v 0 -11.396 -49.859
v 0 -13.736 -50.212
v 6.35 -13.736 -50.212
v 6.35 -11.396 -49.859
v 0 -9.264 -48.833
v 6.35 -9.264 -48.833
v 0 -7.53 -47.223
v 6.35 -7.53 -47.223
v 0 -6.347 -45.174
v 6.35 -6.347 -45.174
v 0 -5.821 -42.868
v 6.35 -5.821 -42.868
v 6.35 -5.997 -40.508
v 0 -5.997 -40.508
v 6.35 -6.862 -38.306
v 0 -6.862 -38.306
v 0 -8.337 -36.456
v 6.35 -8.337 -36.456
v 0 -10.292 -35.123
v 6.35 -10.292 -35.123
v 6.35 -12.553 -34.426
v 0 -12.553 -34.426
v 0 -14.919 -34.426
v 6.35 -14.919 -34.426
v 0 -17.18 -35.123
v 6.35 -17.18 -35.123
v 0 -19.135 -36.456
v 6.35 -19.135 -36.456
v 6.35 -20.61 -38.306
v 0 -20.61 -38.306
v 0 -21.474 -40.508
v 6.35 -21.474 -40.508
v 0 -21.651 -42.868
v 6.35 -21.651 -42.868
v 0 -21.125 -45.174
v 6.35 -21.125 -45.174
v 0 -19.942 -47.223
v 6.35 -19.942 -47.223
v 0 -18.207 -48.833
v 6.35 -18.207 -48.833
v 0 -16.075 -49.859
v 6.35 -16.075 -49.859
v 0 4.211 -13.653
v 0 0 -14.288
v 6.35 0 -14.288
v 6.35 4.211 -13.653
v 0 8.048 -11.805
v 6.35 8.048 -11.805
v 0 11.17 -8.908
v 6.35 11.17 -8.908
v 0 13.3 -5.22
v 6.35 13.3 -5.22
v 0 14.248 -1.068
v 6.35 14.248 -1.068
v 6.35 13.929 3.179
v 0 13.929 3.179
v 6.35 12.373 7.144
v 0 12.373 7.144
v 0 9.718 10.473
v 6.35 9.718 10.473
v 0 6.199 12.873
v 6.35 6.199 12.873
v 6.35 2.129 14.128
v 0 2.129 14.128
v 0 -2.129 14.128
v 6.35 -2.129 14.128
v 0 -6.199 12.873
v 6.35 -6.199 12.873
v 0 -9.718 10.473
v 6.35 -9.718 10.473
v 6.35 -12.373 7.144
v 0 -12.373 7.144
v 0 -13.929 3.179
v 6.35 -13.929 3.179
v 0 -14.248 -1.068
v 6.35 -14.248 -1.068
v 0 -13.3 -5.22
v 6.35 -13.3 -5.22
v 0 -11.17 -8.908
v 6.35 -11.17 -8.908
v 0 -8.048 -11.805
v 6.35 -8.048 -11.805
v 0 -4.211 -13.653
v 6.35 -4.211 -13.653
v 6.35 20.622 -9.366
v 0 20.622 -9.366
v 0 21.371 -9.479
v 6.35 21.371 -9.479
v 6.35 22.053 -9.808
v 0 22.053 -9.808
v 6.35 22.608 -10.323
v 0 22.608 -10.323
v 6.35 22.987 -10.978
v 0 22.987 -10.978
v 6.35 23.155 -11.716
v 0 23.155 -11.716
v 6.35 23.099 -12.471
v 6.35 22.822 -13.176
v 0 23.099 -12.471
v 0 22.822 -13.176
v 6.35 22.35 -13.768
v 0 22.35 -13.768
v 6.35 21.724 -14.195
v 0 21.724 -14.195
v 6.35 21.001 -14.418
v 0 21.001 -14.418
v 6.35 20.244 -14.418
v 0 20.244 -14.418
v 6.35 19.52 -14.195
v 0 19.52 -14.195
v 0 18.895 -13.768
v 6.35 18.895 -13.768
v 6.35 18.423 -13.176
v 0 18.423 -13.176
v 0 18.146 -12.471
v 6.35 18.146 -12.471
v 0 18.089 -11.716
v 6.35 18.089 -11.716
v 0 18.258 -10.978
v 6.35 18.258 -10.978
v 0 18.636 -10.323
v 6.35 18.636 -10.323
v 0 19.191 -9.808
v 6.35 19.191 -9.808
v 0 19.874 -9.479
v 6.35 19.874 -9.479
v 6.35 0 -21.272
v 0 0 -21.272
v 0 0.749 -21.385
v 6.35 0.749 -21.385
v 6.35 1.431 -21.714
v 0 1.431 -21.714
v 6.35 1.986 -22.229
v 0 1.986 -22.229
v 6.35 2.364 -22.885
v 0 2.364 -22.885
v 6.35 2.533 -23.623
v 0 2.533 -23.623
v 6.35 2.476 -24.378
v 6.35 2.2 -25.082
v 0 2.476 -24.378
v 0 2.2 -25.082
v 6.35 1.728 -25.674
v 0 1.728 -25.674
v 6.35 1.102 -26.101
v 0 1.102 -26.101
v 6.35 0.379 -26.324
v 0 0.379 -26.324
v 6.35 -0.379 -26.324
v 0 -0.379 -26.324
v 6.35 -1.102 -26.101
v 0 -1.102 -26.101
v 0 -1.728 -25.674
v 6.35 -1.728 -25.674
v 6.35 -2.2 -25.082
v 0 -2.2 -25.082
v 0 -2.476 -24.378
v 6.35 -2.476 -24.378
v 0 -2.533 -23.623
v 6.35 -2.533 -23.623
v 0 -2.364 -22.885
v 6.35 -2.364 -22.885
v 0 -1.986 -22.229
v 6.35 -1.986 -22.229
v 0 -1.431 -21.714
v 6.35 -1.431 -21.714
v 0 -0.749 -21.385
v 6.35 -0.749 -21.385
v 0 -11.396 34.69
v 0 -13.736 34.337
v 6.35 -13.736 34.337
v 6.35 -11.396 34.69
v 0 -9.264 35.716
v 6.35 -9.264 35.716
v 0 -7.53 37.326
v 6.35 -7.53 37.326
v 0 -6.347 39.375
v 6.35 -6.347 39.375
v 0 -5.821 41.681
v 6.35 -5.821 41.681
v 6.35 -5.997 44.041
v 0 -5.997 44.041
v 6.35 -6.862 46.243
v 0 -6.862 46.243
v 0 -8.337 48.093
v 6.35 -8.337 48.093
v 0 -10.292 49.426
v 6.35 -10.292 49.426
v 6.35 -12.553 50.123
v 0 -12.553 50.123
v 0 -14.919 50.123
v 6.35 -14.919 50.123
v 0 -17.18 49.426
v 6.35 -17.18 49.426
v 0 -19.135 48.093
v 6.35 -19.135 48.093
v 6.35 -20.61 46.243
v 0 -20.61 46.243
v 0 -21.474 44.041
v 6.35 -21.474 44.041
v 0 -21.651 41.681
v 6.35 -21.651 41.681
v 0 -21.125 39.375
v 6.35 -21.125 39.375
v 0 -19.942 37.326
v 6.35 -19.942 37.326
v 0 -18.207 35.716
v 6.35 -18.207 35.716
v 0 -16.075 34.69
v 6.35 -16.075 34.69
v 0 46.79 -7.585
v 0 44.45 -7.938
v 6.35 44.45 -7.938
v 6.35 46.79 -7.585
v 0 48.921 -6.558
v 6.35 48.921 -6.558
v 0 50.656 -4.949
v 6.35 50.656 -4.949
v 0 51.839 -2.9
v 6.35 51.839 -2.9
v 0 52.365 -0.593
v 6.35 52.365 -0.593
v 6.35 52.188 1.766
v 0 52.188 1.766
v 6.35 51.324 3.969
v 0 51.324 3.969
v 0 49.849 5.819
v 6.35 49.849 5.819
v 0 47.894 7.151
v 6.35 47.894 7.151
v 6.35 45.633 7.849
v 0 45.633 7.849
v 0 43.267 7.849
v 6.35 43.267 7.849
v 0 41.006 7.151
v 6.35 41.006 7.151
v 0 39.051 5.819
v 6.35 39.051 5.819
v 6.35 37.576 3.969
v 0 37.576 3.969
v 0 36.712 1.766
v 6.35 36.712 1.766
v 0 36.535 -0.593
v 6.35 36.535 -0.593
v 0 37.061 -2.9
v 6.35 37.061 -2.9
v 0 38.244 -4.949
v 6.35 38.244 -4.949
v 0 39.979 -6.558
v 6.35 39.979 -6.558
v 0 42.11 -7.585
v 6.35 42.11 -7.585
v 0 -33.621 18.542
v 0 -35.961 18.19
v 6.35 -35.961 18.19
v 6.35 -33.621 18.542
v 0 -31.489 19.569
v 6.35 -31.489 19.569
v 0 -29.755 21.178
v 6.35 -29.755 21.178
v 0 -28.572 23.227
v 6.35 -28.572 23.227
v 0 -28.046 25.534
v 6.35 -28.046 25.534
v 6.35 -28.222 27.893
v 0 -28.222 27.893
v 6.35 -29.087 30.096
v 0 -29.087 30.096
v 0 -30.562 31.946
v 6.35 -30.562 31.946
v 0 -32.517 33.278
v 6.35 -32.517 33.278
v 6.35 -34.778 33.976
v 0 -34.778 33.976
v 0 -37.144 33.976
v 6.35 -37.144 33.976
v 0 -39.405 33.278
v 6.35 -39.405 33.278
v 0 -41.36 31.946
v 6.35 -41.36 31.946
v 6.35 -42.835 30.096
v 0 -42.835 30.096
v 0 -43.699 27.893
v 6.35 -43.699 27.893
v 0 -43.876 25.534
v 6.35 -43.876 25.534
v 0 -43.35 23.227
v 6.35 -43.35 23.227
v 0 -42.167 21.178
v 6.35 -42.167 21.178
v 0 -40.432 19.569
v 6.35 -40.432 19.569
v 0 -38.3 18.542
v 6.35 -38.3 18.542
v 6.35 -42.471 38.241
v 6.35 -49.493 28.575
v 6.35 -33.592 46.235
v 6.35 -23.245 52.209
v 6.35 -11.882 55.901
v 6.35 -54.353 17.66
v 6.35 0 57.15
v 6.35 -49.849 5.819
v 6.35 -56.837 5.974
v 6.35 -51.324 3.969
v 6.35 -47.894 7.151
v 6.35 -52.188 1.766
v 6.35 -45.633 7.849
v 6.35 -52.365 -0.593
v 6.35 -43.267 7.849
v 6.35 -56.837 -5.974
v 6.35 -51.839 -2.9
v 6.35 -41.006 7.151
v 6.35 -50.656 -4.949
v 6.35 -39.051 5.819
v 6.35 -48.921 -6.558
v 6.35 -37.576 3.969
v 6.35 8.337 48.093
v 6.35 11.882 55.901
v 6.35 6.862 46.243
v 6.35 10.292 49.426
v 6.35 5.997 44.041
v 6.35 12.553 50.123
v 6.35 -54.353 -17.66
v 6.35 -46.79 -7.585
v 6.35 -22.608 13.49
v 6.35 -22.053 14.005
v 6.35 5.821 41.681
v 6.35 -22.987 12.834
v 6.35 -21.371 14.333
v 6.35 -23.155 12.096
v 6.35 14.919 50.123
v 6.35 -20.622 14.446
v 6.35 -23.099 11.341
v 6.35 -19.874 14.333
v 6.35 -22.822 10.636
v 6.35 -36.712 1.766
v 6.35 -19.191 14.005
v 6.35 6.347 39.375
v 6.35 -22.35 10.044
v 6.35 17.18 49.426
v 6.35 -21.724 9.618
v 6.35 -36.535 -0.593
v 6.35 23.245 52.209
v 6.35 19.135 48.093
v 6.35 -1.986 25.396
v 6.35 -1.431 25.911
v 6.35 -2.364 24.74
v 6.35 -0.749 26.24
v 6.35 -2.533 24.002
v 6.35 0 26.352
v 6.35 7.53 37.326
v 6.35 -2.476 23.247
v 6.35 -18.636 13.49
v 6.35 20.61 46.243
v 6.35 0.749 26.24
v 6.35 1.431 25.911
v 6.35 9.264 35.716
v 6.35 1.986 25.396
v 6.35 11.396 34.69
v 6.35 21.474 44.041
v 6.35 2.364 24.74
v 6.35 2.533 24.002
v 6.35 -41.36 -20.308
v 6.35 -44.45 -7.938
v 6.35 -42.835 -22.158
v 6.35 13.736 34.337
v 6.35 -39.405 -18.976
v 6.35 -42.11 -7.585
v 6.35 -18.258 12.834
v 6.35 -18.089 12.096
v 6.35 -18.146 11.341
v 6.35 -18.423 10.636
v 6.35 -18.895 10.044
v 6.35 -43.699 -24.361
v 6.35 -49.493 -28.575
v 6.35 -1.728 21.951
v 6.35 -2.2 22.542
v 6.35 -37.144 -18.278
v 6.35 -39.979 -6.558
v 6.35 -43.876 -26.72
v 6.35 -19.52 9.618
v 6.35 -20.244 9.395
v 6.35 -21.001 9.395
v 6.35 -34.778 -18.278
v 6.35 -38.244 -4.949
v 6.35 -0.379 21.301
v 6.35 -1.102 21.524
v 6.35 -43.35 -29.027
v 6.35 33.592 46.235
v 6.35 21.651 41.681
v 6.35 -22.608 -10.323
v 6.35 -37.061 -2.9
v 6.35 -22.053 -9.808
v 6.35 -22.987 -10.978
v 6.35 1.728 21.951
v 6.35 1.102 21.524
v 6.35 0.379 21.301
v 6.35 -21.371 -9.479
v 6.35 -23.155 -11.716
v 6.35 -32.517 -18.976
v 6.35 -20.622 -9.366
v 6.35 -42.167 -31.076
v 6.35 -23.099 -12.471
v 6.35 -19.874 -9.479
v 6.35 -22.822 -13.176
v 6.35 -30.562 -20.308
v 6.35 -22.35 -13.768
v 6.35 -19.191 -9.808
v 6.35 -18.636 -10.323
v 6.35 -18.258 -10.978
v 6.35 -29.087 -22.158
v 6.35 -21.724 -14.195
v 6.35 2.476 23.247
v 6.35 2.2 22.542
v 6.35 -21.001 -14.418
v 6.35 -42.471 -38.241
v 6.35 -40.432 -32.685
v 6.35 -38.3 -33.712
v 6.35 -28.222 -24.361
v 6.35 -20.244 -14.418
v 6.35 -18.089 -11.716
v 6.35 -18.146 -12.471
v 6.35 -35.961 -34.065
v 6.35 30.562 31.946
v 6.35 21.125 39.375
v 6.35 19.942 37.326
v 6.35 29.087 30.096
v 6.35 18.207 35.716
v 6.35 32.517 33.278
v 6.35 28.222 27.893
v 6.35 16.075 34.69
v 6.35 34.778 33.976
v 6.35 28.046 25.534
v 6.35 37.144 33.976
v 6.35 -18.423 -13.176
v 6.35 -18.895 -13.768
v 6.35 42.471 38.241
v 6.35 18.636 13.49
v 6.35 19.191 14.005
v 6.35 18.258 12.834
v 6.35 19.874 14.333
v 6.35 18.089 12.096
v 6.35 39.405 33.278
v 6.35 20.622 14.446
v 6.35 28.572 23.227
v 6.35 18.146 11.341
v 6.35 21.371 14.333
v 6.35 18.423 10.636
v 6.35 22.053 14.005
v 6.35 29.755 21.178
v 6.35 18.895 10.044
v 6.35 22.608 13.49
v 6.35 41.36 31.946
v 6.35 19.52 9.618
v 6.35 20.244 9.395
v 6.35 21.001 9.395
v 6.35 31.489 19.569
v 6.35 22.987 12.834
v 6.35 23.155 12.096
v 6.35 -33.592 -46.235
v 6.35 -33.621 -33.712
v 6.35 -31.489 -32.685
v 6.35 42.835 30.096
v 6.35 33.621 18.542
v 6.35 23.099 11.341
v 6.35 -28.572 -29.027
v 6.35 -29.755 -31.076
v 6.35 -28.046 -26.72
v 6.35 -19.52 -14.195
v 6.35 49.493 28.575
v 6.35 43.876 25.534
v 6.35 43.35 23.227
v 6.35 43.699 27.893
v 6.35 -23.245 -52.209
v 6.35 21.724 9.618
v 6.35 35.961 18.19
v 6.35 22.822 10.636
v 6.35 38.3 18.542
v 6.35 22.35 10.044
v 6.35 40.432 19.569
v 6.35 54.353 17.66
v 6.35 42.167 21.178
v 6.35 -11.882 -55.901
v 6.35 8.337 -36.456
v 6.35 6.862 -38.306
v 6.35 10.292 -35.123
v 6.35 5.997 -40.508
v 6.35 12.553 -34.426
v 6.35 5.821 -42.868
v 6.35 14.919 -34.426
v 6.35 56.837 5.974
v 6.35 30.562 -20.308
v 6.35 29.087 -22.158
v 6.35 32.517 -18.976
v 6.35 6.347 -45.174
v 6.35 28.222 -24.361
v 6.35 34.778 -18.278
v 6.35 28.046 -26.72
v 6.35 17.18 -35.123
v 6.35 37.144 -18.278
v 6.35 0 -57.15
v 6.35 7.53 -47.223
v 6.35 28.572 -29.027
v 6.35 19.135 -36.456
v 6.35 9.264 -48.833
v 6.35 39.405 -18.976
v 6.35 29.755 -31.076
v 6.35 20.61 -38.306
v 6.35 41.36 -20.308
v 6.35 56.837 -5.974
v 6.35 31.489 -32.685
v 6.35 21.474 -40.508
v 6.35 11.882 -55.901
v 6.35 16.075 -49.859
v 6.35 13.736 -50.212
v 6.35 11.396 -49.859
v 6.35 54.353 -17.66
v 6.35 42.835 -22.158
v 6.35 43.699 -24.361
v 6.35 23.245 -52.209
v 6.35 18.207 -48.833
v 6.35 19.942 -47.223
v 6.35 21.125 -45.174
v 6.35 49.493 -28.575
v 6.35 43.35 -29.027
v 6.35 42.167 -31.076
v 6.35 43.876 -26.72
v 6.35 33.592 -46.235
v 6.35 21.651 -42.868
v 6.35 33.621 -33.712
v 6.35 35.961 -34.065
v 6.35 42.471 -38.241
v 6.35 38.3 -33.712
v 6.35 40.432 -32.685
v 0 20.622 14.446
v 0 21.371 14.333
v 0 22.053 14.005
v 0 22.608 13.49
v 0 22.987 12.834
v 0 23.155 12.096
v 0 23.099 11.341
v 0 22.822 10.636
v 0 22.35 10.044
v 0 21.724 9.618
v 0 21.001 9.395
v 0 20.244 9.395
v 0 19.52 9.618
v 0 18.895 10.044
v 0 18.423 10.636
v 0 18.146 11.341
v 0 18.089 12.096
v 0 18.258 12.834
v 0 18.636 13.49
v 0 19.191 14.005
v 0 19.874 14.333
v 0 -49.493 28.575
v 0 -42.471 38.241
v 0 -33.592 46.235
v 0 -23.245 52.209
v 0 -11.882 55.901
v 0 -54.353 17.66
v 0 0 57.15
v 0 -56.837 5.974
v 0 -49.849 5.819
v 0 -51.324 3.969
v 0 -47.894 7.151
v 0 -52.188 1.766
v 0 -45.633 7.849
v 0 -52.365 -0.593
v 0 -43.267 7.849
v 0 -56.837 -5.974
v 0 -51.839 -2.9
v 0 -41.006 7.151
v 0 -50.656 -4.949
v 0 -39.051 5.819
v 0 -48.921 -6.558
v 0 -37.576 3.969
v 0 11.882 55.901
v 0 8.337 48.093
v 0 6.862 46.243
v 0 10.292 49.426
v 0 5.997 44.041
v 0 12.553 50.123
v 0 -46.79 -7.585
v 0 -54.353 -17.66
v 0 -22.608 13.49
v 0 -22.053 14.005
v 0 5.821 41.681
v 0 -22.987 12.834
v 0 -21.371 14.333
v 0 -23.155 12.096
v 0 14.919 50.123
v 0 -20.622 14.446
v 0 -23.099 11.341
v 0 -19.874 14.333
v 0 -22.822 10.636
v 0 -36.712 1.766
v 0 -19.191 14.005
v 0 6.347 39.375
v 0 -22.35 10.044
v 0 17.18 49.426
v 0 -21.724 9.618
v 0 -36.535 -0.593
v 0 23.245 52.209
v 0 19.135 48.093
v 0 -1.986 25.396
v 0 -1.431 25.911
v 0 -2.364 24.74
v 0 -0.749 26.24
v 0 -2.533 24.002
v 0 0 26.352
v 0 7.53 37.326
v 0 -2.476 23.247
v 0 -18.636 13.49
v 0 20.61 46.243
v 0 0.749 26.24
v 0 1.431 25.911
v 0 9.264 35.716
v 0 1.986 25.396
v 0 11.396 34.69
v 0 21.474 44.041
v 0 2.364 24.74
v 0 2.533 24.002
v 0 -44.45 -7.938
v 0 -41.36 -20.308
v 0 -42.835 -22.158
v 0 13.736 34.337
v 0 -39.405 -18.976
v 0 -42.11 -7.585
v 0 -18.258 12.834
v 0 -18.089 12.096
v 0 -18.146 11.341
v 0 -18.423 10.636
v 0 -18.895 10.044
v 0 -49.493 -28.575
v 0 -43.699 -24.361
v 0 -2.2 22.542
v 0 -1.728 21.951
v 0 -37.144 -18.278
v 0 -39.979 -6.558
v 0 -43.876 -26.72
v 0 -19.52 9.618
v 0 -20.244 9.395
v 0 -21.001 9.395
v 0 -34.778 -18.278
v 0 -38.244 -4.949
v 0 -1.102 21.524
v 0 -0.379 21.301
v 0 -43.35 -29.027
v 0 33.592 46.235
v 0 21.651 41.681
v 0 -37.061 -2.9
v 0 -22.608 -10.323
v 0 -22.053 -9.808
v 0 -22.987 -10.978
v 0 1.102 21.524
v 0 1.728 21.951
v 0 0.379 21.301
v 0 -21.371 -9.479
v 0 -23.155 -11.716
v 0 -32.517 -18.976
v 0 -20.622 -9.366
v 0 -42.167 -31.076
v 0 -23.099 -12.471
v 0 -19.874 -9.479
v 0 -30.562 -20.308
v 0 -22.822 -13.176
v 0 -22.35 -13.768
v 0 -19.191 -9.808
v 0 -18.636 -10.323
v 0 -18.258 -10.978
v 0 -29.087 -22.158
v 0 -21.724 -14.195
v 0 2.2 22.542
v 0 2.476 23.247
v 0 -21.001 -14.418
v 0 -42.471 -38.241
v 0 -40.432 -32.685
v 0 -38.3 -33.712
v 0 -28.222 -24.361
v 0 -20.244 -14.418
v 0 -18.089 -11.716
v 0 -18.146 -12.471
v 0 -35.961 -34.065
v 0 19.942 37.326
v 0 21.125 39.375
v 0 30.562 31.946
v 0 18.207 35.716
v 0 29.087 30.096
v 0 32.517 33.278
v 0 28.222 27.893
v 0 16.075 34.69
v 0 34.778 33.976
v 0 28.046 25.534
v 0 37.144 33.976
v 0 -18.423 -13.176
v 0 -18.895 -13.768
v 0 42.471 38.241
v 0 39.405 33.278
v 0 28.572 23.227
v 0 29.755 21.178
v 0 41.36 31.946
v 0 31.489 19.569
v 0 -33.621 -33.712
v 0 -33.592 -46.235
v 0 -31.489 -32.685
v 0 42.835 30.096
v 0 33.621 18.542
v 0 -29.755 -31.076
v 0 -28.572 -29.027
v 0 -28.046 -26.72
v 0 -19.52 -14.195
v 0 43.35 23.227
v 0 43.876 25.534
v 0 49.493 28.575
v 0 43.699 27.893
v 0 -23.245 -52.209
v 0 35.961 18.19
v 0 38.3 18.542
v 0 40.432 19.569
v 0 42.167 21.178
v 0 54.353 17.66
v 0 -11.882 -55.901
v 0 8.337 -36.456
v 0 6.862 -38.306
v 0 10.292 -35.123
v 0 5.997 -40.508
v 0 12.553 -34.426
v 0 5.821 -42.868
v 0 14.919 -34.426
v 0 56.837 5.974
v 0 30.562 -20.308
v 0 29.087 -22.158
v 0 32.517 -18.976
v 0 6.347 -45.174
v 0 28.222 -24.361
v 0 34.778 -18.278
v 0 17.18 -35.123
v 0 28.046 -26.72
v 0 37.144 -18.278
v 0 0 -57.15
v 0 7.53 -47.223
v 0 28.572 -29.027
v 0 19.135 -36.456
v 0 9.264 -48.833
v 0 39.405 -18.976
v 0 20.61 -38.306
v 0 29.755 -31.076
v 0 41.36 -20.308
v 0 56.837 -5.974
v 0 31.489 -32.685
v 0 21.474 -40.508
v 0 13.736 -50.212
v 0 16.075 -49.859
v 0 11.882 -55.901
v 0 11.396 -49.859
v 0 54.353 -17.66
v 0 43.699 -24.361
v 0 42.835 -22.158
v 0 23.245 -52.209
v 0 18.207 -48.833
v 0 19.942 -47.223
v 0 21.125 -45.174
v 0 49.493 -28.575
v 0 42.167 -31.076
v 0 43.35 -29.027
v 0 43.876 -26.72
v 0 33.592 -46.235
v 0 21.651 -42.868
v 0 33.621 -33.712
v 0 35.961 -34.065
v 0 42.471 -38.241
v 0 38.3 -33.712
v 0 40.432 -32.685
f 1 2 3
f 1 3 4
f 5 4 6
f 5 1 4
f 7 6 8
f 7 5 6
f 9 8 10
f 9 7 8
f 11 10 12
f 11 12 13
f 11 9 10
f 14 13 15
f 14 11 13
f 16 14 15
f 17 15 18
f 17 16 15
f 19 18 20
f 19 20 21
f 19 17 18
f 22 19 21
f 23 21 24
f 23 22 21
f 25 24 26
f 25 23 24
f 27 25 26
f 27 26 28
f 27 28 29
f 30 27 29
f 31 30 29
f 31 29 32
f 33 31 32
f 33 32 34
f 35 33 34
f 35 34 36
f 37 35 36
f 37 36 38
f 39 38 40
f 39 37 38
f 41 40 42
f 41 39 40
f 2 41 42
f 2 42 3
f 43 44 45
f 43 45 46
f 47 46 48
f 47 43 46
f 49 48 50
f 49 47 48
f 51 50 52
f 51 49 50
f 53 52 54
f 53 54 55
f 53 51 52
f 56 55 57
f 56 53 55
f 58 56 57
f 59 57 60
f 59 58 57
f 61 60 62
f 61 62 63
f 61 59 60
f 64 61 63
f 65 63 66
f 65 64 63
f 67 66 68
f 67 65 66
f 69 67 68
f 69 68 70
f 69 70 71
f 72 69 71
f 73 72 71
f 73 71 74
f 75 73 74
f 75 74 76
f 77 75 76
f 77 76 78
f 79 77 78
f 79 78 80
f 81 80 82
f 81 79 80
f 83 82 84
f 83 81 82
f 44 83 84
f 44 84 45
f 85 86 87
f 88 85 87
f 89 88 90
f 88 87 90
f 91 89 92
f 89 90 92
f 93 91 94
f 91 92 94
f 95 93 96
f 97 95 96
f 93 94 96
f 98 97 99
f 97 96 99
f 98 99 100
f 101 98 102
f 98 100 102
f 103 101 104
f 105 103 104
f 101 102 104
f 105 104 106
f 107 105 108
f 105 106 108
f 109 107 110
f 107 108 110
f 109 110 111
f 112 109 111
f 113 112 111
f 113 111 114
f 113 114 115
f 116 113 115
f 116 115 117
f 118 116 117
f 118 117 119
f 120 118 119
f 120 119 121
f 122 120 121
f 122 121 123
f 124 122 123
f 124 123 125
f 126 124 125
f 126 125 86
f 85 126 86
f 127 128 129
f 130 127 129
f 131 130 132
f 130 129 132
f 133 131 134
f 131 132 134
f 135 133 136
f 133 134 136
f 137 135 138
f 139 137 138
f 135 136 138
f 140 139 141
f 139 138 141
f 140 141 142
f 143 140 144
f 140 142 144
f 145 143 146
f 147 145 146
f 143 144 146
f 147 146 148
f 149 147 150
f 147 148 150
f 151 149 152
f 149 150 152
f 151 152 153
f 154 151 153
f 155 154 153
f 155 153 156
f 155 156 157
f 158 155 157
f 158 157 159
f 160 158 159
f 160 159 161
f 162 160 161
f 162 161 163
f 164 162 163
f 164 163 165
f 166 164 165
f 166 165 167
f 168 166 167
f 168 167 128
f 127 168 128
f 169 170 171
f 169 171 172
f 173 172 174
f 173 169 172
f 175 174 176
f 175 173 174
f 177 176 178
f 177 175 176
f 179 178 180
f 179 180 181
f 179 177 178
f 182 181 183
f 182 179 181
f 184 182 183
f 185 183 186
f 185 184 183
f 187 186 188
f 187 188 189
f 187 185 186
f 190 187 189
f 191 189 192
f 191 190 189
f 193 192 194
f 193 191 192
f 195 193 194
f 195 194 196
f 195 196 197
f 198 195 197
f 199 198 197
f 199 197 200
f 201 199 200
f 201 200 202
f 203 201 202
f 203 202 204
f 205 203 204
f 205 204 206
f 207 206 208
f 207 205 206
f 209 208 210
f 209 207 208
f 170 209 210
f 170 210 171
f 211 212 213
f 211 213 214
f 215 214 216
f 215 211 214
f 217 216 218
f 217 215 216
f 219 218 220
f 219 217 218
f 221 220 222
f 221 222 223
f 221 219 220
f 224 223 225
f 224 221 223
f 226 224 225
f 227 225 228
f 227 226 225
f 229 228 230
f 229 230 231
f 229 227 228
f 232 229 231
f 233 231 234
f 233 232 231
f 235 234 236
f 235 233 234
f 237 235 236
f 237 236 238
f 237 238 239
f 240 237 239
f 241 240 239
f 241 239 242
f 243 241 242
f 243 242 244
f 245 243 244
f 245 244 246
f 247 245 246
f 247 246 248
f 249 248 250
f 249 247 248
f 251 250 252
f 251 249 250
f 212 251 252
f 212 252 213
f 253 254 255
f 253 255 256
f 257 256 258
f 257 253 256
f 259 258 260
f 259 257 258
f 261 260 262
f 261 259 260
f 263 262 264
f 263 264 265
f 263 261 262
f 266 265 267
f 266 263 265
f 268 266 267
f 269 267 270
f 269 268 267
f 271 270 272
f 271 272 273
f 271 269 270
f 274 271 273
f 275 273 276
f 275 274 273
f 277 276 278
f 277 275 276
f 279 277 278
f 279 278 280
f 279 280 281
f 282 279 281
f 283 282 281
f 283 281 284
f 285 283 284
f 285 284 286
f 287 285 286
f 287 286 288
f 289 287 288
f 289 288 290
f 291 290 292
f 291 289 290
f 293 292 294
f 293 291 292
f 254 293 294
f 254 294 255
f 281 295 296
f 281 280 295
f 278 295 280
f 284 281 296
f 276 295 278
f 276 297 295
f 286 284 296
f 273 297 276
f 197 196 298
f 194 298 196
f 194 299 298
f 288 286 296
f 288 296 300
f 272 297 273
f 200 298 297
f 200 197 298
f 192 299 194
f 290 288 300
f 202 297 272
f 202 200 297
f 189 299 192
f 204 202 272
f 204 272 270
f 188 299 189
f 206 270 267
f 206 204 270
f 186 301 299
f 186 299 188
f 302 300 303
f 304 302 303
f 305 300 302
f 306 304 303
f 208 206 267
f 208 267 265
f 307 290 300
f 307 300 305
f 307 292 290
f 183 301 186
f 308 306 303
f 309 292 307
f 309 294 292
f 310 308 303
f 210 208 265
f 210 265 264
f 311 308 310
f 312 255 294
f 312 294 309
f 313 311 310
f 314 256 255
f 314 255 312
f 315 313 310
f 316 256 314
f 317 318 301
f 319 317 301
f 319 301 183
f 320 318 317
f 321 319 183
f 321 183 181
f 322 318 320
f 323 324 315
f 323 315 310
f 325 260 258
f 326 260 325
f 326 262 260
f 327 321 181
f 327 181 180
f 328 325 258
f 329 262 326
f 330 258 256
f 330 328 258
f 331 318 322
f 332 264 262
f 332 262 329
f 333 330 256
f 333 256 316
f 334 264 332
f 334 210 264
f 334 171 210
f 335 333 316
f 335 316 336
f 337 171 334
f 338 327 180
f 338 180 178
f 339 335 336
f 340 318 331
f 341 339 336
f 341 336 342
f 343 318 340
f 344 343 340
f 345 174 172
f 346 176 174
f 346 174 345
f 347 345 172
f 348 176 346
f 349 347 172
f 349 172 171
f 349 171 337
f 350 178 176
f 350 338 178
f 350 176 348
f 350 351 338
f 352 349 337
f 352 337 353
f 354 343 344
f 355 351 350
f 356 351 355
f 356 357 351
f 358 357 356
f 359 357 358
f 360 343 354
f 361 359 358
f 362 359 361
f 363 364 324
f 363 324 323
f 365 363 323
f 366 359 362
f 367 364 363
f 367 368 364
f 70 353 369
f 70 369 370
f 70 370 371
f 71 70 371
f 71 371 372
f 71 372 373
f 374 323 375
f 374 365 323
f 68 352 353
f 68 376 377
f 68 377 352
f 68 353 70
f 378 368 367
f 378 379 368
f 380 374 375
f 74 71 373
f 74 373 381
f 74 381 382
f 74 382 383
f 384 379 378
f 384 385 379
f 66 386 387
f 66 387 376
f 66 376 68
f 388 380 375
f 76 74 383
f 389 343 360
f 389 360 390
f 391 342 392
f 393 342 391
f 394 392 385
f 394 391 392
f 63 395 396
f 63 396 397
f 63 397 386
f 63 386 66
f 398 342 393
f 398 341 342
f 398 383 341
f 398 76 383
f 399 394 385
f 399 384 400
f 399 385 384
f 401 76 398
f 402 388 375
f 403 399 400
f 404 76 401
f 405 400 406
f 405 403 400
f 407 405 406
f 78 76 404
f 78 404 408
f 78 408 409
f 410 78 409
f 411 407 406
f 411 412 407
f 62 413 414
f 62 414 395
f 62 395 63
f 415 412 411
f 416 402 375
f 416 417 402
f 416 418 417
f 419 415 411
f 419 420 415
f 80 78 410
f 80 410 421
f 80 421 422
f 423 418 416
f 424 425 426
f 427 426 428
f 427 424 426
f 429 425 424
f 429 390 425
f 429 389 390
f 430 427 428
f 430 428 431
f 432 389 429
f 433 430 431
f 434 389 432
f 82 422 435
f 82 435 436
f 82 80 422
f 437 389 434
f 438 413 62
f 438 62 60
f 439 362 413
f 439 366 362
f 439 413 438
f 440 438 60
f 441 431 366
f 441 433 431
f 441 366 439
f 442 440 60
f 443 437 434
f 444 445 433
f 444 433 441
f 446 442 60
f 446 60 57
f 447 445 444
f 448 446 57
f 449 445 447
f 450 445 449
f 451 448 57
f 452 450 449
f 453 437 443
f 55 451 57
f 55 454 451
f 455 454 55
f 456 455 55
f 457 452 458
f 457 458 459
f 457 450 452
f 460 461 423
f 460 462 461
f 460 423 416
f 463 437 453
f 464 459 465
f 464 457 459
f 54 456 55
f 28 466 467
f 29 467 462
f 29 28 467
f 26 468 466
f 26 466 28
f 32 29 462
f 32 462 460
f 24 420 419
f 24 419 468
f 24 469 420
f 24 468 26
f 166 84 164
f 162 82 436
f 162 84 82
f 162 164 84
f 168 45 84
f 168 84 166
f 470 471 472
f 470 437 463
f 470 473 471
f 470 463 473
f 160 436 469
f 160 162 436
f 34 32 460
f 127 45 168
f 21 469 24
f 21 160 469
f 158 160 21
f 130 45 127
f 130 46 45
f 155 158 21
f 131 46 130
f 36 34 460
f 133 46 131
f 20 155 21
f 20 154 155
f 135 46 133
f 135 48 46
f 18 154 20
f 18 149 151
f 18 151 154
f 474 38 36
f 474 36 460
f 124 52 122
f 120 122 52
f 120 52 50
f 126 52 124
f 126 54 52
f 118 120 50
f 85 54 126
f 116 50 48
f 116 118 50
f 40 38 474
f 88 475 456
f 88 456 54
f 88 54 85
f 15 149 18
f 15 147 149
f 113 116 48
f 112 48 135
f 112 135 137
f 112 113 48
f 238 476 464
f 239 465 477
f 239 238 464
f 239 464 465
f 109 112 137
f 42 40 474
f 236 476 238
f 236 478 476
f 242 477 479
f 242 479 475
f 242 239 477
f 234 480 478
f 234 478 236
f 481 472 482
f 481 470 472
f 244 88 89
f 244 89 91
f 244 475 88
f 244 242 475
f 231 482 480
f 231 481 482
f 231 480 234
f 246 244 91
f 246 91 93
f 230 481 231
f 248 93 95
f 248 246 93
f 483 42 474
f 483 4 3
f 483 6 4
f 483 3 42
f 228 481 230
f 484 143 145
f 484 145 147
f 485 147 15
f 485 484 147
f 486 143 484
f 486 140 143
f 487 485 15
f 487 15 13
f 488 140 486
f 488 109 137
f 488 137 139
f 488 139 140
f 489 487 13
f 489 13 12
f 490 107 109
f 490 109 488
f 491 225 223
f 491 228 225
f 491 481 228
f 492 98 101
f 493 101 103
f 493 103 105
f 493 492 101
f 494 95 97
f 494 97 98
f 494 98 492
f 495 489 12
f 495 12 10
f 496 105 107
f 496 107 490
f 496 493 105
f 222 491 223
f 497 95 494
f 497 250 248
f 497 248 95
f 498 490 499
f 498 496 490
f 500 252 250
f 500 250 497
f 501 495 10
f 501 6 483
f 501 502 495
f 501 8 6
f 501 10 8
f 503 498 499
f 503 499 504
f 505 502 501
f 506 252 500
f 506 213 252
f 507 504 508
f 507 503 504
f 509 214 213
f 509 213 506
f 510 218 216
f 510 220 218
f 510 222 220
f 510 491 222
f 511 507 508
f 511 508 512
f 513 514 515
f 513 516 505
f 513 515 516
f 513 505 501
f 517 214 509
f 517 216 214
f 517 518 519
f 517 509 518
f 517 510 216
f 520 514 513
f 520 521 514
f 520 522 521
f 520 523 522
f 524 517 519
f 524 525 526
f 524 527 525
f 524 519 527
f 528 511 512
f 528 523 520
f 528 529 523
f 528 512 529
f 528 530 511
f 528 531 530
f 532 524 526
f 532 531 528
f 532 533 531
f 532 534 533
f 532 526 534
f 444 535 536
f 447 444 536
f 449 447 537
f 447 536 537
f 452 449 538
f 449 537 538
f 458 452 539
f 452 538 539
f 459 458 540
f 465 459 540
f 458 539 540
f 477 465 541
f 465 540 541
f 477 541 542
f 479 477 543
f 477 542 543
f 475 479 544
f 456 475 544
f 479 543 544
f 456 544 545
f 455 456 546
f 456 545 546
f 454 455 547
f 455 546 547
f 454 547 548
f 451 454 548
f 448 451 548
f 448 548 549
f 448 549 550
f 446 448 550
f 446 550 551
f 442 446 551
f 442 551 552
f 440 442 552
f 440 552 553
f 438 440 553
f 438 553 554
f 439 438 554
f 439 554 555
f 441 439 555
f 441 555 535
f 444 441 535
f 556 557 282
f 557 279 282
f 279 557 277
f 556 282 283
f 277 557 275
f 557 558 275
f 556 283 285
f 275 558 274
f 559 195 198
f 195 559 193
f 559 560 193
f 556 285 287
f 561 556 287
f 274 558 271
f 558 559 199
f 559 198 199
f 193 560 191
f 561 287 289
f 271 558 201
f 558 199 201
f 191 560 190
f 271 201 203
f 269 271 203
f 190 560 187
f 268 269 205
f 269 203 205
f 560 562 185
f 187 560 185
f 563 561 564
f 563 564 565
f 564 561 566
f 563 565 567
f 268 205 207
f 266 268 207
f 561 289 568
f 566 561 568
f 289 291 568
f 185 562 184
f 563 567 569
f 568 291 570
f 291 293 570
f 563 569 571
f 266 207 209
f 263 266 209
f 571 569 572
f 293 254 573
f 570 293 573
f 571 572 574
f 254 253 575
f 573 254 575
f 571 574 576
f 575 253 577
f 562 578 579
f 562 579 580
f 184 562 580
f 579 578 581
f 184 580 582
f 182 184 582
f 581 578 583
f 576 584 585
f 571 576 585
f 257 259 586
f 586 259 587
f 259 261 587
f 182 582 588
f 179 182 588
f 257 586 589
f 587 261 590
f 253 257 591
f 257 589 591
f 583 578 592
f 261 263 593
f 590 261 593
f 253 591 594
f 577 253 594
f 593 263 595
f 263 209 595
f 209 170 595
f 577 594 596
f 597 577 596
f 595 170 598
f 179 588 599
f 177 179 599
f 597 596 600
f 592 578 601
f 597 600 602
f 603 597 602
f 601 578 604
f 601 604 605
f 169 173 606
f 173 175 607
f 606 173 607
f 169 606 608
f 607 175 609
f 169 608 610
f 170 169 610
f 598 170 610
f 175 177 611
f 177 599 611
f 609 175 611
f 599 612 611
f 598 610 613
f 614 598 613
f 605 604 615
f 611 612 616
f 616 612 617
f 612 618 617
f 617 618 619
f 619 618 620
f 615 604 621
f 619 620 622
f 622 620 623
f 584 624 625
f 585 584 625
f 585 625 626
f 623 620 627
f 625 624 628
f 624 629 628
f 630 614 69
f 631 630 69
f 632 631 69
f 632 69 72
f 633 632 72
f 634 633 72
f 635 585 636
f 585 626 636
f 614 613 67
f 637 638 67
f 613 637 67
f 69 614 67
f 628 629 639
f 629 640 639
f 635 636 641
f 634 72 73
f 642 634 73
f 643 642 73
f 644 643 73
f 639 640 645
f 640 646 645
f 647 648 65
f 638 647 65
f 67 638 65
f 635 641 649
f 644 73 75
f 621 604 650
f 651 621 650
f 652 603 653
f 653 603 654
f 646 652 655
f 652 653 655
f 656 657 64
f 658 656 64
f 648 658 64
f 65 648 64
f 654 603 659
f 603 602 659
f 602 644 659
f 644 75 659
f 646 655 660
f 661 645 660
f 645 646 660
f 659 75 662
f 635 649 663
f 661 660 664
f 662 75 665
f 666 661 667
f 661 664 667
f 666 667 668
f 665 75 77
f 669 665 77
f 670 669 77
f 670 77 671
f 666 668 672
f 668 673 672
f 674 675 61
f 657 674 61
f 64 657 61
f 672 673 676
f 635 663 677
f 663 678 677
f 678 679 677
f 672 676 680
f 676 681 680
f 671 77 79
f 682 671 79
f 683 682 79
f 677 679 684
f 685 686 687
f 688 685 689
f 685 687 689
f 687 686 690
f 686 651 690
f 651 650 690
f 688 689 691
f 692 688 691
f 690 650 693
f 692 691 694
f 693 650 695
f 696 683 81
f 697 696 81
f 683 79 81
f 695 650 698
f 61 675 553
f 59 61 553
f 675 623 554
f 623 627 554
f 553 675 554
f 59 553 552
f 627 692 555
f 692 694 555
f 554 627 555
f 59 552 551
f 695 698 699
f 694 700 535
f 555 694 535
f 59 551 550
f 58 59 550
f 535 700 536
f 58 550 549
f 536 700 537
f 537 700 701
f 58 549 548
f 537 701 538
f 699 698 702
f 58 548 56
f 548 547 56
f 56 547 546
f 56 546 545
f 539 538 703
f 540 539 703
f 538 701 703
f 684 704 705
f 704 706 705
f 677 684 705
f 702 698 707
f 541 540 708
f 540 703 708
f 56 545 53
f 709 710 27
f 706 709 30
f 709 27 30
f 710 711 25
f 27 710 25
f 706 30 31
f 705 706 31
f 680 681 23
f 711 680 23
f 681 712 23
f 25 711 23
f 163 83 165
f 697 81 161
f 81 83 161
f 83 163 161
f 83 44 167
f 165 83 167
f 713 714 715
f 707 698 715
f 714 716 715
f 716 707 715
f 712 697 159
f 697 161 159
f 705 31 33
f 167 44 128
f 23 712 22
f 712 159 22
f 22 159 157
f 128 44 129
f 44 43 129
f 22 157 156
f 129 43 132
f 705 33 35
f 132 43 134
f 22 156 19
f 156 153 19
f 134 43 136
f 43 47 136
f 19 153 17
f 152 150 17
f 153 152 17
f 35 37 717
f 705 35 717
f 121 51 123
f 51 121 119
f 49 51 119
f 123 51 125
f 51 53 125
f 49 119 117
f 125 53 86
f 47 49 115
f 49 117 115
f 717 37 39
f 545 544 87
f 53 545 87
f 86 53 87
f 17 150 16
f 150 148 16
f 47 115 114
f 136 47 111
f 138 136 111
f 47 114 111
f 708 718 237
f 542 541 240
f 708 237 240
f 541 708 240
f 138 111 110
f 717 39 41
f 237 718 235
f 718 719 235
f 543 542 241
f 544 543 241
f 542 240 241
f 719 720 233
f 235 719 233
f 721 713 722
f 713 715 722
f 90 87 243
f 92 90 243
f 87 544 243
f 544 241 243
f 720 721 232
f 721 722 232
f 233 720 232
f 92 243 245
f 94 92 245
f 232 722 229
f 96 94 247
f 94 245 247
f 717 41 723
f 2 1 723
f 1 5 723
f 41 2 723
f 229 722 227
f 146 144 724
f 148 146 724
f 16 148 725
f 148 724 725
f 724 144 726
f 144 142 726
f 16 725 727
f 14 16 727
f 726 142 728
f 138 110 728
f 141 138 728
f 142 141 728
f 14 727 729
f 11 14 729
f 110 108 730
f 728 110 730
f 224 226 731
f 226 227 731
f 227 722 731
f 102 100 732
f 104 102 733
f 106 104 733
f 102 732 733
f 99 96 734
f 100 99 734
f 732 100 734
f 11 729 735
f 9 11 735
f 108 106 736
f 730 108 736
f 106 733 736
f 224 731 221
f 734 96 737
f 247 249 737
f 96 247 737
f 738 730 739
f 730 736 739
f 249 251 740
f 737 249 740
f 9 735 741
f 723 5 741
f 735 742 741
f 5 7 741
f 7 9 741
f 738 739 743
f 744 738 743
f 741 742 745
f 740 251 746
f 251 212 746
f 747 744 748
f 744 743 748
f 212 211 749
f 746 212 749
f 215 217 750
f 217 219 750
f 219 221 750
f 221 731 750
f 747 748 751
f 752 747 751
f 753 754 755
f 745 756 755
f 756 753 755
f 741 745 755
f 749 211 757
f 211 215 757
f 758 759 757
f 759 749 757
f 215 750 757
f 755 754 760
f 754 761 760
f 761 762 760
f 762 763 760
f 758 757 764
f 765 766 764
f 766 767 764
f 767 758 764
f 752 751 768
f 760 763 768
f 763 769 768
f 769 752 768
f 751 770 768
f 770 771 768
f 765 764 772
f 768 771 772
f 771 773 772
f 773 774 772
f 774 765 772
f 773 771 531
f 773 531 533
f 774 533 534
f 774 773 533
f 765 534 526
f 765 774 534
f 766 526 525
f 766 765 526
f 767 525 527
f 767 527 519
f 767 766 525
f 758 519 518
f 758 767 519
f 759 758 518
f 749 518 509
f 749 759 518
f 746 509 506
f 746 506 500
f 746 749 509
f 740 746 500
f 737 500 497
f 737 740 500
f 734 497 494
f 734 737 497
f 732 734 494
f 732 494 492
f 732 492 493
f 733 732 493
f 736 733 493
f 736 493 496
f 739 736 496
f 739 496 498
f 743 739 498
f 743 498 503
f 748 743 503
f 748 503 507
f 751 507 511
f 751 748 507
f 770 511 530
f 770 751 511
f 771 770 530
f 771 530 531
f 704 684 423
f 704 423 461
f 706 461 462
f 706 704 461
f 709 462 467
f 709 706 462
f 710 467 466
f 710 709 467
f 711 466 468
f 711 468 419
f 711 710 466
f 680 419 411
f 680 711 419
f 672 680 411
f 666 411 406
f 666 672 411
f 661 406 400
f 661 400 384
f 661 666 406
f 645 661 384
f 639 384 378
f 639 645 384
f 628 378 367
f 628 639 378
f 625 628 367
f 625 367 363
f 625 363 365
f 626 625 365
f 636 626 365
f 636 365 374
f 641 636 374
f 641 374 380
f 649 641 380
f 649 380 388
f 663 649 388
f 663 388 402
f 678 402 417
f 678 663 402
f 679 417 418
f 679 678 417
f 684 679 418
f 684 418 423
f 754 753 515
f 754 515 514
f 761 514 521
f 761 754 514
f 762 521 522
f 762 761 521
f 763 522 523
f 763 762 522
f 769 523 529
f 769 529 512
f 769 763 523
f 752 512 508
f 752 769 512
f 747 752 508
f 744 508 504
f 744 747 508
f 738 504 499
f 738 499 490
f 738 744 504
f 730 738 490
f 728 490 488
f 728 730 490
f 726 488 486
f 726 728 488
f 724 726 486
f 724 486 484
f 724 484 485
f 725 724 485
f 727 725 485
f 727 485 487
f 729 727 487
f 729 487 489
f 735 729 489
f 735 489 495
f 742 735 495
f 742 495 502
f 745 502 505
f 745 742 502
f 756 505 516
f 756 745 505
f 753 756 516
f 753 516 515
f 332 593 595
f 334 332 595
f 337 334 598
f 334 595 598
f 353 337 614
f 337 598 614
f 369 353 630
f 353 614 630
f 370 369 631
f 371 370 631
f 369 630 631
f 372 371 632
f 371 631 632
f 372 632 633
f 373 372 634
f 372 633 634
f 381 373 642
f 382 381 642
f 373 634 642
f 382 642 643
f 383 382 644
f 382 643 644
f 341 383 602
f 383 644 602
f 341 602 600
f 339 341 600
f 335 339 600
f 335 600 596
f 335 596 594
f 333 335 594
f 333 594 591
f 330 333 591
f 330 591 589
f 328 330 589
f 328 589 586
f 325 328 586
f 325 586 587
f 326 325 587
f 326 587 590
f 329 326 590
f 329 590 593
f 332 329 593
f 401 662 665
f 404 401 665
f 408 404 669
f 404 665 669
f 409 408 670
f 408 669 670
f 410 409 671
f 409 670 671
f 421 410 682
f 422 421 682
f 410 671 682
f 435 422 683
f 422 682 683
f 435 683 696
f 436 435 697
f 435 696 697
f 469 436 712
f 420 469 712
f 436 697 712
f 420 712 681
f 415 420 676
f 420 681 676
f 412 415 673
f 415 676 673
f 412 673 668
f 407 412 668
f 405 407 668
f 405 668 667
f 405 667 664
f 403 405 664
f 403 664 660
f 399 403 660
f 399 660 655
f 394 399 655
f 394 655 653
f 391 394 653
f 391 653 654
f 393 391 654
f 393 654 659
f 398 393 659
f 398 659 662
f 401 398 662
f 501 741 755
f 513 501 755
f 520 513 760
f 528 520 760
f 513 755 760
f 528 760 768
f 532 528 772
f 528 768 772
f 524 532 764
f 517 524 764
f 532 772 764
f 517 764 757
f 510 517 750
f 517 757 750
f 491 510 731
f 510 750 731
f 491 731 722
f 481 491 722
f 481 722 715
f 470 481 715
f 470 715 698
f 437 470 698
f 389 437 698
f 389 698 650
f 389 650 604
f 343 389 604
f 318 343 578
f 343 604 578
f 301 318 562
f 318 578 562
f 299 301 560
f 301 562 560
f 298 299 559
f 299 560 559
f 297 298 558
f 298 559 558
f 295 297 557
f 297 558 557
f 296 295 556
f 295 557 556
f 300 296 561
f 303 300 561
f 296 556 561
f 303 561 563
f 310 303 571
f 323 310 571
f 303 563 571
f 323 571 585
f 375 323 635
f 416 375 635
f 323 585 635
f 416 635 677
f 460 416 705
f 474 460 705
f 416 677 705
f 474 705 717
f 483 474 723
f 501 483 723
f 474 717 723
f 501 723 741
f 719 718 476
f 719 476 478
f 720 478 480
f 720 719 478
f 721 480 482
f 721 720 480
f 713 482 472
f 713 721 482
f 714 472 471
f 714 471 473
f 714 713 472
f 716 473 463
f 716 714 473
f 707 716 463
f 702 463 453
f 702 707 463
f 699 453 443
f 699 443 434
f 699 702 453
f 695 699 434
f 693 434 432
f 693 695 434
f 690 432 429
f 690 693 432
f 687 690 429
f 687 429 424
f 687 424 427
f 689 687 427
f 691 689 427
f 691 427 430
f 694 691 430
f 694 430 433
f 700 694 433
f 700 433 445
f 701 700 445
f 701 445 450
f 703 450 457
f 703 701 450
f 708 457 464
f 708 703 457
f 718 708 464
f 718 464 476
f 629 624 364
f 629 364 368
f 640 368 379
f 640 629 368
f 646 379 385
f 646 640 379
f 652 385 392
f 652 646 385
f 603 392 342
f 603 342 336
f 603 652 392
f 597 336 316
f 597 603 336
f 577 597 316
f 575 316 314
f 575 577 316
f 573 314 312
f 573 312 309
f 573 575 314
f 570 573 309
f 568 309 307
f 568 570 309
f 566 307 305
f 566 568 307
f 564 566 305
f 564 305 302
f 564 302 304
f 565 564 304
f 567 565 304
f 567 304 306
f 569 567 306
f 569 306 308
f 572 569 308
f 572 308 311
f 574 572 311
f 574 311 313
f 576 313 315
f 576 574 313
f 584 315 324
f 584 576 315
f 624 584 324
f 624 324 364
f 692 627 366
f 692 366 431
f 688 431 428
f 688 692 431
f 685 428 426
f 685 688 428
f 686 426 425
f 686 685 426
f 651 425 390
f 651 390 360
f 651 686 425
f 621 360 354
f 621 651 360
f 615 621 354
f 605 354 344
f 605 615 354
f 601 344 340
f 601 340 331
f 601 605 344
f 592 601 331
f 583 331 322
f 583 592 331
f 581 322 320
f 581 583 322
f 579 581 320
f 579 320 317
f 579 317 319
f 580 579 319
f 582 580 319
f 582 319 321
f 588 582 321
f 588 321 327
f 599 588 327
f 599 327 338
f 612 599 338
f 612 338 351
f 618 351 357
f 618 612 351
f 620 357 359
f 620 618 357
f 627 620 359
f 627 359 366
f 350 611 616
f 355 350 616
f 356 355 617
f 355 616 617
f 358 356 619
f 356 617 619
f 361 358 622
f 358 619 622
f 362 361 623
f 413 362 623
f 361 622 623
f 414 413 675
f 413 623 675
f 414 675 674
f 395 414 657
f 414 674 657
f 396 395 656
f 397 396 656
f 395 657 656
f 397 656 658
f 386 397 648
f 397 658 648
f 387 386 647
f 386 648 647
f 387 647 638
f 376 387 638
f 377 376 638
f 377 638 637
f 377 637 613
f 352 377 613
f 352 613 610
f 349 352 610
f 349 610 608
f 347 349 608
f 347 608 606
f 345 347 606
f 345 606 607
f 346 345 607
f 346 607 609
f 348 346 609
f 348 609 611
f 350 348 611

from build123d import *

# Parameters (mm, degrees)
SKETCH1_R           = 57.15
SKETCH1_R_2         = 14.2875
SKETCH1_R_3         = 7.9375
BOSS_EXTRUDE1_DEPTH = 6.35
CUT_EXTRUDE1_REACH  = 8.35
SKETCH4_R           = 2.54


with BuildPart() as part:
    # Sketch1 → Boss-Extrude1 (new body)
    with BuildSketch(Plane(origin=(0, 0, 0), x_dir=(0, 0, -1), z_dir=(1, 0, 0))):
        Circle(SKETCH1_R)
        Circle(SKETCH1_R_2, mode=Mode.SUBTRACT)
        with Locations((0, 44.45)):
            Circle(SKETCH1_R_3, mode=Mode.SUBTRACT)
        with Locations((26.127054464, 35.9608054)):
            Circle(SKETCH1_R_3, mode=Mode.SUBTRACT)
        with Locations((42.274462149, 13.7358054)):
            Circle(SKETCH1_R_3, mode=Mode.SUBTRACT)
        with Locations((42.274462149, -13.7358054)):
            Circle(SKETCH1_R_3, mode=Mode.SUBTRACT)
        with Locations((26.127054464, -35.9608054)):
            Circle(SKETCH1_R_3, mode=Mode.SUBTRACT)
        with Locations((0, -44.45)):
            Circle(SKETCH1_R_3, mode=Mode.SUBTRACT)
        with Locations((-26.127054464, -35.9608054)):
            Circle(SKETCH1_R_3, mode=Mode.SUBTRACT)
        with Locations((-42.274462149, -13.7358054)):
            Circle(SKETCH1_R_3, mode=Mode.SUBTRACT)
        with Locations((-42.274462149, 13.7358054)):
            Circle(SKETCH1_R_3, mode=Mode.SUBTRACT)
        with Locations((-26.127054464, 35.9608054)):
            Circle(SKETCH1_R_3, mode=Mode.SUBTRACT)
    extrude(amount=BOSS_EXTRUDE1_DEPTH)

    # Sketch4 → Cut-Extrude1 (cut, up to next)
    with BuildSketch(Plane.ZY, mode=Mode.PRIVATE) as cut_extrude1_sk1:
        with Locations((-11.90625, -20.622229928)):
            Circle(SKETCH4_R)
    cut_extrude1_tool1 = extrude(cut_extrude1_sk1.sketch, amount=-CUT_EXTRUDE1_REACH, mode=Mode.PRIVATE) & part.part
    add(cut_extrude1_tool1.solids().sort_by_distance((0, -20.62223, -11.90625))[0], mode=Mode.SUBTRACT)
    # Sketch4 → Cut-Extrude1 (cut, up to next)
    with BuildSketch(Plane.ZY, mode=Mode.PRIVATE) as cut_extrude1_sk2:
        with Locations((-23.8125, 0)):
            Circle(SKETCH4_R)
    cut_extrude1_tool2 = extrude(cut_extrude1_sk2.sketch, amount=-CUT_EXTRUDE1_REACH, mode=Mode.PRIVATE) & part.part
    add(cut_extrude1_tool2.solids().sort_by_distance((0, 0, -23.8125))[0], mode=Mode.SUBTRACT)
    # Sketch4 → Cut-Extrude1 (cut, up to next)
    with BuildSketch(Plane.ZY, mode=Mode.PRIVATE) as cut_extrude1_sk3:
        with Locations((-11.90625, 20.622229928)):
            Circle(SKETCH4_R)
    cut_extrude1_tool3 = extrude(cut_extrude1_sk3.sketch, amount=-CUT_EXTRUDE1_REACH, mode=Mode.PRIVATE) & part.part
    add(cut_extrude1_tool3.solids().sort_by_distance((0, 20.62223, -11.90625))[0], mode=Mode.SUBTRACT)
    # Sketch4 → Cut-Extrude1 (cut, up to next)
    with BuildSketch(Plane.ZY, mode=Mode.PRIVATE) as cut_extrude1_sk4:
        with Locations((11.90625, 20.622229928)):
            Circle(SKETCH4_R)
    cut_extrude1_tool4 = extrude(cut_extrude1_sk4.sketch, amount=-CUT_EXTRUDE1_REACH, mode=Mode.PRIVATE) & part.part
    add(cut_extrude1_tool4.solids().sort_by_distance((0, 20.62223, 11.90625))[0], mode=Mode.SUBTRACT)
    # Sketch4 → Cut-Extrude1 (cut, up to next)
    with BuildSketch(Plane.ZY, mode=Mode.PRIVATE) as cut_extrude1_sk5:
        with Locations((23.8125, 0)):
            Circle(SKETCH4_R)
    cut_extrude1_tool5 = extrude(cut_extrude1_sk5.sketch, amount=-CUT_EXTRUDE1_REACH, mode=Mode.PRIVATE) & part.part
    add(cut_extrude1_tool5.solids().sort_by_distance((0, 0, 23.8125))[0], mode=Mode.SUBTRACT)
    # Sketch4 → Cut-Extrude1 (cut, up to next)
    with BuildSketch(Plane.ZY, mode=Mode.PRIVATE) as cut_extrude1_sk6:
        with Locations((11.90625, -20.622229928)):
            Circle(SKETCH4_R)
    cut_extrude1_tool6 = extrude(cut_extrude1_sk6.sketch, amount=-CUT_EXTRUDE1_REACH, mode=Mode.PRIVATE) & part.part
    add(cut_extrude1_tool6.solids().sort_by_distance((0, -20.62223, 11.90625))[0], mode=Mode.SUBTRACT)


solid = part.part
